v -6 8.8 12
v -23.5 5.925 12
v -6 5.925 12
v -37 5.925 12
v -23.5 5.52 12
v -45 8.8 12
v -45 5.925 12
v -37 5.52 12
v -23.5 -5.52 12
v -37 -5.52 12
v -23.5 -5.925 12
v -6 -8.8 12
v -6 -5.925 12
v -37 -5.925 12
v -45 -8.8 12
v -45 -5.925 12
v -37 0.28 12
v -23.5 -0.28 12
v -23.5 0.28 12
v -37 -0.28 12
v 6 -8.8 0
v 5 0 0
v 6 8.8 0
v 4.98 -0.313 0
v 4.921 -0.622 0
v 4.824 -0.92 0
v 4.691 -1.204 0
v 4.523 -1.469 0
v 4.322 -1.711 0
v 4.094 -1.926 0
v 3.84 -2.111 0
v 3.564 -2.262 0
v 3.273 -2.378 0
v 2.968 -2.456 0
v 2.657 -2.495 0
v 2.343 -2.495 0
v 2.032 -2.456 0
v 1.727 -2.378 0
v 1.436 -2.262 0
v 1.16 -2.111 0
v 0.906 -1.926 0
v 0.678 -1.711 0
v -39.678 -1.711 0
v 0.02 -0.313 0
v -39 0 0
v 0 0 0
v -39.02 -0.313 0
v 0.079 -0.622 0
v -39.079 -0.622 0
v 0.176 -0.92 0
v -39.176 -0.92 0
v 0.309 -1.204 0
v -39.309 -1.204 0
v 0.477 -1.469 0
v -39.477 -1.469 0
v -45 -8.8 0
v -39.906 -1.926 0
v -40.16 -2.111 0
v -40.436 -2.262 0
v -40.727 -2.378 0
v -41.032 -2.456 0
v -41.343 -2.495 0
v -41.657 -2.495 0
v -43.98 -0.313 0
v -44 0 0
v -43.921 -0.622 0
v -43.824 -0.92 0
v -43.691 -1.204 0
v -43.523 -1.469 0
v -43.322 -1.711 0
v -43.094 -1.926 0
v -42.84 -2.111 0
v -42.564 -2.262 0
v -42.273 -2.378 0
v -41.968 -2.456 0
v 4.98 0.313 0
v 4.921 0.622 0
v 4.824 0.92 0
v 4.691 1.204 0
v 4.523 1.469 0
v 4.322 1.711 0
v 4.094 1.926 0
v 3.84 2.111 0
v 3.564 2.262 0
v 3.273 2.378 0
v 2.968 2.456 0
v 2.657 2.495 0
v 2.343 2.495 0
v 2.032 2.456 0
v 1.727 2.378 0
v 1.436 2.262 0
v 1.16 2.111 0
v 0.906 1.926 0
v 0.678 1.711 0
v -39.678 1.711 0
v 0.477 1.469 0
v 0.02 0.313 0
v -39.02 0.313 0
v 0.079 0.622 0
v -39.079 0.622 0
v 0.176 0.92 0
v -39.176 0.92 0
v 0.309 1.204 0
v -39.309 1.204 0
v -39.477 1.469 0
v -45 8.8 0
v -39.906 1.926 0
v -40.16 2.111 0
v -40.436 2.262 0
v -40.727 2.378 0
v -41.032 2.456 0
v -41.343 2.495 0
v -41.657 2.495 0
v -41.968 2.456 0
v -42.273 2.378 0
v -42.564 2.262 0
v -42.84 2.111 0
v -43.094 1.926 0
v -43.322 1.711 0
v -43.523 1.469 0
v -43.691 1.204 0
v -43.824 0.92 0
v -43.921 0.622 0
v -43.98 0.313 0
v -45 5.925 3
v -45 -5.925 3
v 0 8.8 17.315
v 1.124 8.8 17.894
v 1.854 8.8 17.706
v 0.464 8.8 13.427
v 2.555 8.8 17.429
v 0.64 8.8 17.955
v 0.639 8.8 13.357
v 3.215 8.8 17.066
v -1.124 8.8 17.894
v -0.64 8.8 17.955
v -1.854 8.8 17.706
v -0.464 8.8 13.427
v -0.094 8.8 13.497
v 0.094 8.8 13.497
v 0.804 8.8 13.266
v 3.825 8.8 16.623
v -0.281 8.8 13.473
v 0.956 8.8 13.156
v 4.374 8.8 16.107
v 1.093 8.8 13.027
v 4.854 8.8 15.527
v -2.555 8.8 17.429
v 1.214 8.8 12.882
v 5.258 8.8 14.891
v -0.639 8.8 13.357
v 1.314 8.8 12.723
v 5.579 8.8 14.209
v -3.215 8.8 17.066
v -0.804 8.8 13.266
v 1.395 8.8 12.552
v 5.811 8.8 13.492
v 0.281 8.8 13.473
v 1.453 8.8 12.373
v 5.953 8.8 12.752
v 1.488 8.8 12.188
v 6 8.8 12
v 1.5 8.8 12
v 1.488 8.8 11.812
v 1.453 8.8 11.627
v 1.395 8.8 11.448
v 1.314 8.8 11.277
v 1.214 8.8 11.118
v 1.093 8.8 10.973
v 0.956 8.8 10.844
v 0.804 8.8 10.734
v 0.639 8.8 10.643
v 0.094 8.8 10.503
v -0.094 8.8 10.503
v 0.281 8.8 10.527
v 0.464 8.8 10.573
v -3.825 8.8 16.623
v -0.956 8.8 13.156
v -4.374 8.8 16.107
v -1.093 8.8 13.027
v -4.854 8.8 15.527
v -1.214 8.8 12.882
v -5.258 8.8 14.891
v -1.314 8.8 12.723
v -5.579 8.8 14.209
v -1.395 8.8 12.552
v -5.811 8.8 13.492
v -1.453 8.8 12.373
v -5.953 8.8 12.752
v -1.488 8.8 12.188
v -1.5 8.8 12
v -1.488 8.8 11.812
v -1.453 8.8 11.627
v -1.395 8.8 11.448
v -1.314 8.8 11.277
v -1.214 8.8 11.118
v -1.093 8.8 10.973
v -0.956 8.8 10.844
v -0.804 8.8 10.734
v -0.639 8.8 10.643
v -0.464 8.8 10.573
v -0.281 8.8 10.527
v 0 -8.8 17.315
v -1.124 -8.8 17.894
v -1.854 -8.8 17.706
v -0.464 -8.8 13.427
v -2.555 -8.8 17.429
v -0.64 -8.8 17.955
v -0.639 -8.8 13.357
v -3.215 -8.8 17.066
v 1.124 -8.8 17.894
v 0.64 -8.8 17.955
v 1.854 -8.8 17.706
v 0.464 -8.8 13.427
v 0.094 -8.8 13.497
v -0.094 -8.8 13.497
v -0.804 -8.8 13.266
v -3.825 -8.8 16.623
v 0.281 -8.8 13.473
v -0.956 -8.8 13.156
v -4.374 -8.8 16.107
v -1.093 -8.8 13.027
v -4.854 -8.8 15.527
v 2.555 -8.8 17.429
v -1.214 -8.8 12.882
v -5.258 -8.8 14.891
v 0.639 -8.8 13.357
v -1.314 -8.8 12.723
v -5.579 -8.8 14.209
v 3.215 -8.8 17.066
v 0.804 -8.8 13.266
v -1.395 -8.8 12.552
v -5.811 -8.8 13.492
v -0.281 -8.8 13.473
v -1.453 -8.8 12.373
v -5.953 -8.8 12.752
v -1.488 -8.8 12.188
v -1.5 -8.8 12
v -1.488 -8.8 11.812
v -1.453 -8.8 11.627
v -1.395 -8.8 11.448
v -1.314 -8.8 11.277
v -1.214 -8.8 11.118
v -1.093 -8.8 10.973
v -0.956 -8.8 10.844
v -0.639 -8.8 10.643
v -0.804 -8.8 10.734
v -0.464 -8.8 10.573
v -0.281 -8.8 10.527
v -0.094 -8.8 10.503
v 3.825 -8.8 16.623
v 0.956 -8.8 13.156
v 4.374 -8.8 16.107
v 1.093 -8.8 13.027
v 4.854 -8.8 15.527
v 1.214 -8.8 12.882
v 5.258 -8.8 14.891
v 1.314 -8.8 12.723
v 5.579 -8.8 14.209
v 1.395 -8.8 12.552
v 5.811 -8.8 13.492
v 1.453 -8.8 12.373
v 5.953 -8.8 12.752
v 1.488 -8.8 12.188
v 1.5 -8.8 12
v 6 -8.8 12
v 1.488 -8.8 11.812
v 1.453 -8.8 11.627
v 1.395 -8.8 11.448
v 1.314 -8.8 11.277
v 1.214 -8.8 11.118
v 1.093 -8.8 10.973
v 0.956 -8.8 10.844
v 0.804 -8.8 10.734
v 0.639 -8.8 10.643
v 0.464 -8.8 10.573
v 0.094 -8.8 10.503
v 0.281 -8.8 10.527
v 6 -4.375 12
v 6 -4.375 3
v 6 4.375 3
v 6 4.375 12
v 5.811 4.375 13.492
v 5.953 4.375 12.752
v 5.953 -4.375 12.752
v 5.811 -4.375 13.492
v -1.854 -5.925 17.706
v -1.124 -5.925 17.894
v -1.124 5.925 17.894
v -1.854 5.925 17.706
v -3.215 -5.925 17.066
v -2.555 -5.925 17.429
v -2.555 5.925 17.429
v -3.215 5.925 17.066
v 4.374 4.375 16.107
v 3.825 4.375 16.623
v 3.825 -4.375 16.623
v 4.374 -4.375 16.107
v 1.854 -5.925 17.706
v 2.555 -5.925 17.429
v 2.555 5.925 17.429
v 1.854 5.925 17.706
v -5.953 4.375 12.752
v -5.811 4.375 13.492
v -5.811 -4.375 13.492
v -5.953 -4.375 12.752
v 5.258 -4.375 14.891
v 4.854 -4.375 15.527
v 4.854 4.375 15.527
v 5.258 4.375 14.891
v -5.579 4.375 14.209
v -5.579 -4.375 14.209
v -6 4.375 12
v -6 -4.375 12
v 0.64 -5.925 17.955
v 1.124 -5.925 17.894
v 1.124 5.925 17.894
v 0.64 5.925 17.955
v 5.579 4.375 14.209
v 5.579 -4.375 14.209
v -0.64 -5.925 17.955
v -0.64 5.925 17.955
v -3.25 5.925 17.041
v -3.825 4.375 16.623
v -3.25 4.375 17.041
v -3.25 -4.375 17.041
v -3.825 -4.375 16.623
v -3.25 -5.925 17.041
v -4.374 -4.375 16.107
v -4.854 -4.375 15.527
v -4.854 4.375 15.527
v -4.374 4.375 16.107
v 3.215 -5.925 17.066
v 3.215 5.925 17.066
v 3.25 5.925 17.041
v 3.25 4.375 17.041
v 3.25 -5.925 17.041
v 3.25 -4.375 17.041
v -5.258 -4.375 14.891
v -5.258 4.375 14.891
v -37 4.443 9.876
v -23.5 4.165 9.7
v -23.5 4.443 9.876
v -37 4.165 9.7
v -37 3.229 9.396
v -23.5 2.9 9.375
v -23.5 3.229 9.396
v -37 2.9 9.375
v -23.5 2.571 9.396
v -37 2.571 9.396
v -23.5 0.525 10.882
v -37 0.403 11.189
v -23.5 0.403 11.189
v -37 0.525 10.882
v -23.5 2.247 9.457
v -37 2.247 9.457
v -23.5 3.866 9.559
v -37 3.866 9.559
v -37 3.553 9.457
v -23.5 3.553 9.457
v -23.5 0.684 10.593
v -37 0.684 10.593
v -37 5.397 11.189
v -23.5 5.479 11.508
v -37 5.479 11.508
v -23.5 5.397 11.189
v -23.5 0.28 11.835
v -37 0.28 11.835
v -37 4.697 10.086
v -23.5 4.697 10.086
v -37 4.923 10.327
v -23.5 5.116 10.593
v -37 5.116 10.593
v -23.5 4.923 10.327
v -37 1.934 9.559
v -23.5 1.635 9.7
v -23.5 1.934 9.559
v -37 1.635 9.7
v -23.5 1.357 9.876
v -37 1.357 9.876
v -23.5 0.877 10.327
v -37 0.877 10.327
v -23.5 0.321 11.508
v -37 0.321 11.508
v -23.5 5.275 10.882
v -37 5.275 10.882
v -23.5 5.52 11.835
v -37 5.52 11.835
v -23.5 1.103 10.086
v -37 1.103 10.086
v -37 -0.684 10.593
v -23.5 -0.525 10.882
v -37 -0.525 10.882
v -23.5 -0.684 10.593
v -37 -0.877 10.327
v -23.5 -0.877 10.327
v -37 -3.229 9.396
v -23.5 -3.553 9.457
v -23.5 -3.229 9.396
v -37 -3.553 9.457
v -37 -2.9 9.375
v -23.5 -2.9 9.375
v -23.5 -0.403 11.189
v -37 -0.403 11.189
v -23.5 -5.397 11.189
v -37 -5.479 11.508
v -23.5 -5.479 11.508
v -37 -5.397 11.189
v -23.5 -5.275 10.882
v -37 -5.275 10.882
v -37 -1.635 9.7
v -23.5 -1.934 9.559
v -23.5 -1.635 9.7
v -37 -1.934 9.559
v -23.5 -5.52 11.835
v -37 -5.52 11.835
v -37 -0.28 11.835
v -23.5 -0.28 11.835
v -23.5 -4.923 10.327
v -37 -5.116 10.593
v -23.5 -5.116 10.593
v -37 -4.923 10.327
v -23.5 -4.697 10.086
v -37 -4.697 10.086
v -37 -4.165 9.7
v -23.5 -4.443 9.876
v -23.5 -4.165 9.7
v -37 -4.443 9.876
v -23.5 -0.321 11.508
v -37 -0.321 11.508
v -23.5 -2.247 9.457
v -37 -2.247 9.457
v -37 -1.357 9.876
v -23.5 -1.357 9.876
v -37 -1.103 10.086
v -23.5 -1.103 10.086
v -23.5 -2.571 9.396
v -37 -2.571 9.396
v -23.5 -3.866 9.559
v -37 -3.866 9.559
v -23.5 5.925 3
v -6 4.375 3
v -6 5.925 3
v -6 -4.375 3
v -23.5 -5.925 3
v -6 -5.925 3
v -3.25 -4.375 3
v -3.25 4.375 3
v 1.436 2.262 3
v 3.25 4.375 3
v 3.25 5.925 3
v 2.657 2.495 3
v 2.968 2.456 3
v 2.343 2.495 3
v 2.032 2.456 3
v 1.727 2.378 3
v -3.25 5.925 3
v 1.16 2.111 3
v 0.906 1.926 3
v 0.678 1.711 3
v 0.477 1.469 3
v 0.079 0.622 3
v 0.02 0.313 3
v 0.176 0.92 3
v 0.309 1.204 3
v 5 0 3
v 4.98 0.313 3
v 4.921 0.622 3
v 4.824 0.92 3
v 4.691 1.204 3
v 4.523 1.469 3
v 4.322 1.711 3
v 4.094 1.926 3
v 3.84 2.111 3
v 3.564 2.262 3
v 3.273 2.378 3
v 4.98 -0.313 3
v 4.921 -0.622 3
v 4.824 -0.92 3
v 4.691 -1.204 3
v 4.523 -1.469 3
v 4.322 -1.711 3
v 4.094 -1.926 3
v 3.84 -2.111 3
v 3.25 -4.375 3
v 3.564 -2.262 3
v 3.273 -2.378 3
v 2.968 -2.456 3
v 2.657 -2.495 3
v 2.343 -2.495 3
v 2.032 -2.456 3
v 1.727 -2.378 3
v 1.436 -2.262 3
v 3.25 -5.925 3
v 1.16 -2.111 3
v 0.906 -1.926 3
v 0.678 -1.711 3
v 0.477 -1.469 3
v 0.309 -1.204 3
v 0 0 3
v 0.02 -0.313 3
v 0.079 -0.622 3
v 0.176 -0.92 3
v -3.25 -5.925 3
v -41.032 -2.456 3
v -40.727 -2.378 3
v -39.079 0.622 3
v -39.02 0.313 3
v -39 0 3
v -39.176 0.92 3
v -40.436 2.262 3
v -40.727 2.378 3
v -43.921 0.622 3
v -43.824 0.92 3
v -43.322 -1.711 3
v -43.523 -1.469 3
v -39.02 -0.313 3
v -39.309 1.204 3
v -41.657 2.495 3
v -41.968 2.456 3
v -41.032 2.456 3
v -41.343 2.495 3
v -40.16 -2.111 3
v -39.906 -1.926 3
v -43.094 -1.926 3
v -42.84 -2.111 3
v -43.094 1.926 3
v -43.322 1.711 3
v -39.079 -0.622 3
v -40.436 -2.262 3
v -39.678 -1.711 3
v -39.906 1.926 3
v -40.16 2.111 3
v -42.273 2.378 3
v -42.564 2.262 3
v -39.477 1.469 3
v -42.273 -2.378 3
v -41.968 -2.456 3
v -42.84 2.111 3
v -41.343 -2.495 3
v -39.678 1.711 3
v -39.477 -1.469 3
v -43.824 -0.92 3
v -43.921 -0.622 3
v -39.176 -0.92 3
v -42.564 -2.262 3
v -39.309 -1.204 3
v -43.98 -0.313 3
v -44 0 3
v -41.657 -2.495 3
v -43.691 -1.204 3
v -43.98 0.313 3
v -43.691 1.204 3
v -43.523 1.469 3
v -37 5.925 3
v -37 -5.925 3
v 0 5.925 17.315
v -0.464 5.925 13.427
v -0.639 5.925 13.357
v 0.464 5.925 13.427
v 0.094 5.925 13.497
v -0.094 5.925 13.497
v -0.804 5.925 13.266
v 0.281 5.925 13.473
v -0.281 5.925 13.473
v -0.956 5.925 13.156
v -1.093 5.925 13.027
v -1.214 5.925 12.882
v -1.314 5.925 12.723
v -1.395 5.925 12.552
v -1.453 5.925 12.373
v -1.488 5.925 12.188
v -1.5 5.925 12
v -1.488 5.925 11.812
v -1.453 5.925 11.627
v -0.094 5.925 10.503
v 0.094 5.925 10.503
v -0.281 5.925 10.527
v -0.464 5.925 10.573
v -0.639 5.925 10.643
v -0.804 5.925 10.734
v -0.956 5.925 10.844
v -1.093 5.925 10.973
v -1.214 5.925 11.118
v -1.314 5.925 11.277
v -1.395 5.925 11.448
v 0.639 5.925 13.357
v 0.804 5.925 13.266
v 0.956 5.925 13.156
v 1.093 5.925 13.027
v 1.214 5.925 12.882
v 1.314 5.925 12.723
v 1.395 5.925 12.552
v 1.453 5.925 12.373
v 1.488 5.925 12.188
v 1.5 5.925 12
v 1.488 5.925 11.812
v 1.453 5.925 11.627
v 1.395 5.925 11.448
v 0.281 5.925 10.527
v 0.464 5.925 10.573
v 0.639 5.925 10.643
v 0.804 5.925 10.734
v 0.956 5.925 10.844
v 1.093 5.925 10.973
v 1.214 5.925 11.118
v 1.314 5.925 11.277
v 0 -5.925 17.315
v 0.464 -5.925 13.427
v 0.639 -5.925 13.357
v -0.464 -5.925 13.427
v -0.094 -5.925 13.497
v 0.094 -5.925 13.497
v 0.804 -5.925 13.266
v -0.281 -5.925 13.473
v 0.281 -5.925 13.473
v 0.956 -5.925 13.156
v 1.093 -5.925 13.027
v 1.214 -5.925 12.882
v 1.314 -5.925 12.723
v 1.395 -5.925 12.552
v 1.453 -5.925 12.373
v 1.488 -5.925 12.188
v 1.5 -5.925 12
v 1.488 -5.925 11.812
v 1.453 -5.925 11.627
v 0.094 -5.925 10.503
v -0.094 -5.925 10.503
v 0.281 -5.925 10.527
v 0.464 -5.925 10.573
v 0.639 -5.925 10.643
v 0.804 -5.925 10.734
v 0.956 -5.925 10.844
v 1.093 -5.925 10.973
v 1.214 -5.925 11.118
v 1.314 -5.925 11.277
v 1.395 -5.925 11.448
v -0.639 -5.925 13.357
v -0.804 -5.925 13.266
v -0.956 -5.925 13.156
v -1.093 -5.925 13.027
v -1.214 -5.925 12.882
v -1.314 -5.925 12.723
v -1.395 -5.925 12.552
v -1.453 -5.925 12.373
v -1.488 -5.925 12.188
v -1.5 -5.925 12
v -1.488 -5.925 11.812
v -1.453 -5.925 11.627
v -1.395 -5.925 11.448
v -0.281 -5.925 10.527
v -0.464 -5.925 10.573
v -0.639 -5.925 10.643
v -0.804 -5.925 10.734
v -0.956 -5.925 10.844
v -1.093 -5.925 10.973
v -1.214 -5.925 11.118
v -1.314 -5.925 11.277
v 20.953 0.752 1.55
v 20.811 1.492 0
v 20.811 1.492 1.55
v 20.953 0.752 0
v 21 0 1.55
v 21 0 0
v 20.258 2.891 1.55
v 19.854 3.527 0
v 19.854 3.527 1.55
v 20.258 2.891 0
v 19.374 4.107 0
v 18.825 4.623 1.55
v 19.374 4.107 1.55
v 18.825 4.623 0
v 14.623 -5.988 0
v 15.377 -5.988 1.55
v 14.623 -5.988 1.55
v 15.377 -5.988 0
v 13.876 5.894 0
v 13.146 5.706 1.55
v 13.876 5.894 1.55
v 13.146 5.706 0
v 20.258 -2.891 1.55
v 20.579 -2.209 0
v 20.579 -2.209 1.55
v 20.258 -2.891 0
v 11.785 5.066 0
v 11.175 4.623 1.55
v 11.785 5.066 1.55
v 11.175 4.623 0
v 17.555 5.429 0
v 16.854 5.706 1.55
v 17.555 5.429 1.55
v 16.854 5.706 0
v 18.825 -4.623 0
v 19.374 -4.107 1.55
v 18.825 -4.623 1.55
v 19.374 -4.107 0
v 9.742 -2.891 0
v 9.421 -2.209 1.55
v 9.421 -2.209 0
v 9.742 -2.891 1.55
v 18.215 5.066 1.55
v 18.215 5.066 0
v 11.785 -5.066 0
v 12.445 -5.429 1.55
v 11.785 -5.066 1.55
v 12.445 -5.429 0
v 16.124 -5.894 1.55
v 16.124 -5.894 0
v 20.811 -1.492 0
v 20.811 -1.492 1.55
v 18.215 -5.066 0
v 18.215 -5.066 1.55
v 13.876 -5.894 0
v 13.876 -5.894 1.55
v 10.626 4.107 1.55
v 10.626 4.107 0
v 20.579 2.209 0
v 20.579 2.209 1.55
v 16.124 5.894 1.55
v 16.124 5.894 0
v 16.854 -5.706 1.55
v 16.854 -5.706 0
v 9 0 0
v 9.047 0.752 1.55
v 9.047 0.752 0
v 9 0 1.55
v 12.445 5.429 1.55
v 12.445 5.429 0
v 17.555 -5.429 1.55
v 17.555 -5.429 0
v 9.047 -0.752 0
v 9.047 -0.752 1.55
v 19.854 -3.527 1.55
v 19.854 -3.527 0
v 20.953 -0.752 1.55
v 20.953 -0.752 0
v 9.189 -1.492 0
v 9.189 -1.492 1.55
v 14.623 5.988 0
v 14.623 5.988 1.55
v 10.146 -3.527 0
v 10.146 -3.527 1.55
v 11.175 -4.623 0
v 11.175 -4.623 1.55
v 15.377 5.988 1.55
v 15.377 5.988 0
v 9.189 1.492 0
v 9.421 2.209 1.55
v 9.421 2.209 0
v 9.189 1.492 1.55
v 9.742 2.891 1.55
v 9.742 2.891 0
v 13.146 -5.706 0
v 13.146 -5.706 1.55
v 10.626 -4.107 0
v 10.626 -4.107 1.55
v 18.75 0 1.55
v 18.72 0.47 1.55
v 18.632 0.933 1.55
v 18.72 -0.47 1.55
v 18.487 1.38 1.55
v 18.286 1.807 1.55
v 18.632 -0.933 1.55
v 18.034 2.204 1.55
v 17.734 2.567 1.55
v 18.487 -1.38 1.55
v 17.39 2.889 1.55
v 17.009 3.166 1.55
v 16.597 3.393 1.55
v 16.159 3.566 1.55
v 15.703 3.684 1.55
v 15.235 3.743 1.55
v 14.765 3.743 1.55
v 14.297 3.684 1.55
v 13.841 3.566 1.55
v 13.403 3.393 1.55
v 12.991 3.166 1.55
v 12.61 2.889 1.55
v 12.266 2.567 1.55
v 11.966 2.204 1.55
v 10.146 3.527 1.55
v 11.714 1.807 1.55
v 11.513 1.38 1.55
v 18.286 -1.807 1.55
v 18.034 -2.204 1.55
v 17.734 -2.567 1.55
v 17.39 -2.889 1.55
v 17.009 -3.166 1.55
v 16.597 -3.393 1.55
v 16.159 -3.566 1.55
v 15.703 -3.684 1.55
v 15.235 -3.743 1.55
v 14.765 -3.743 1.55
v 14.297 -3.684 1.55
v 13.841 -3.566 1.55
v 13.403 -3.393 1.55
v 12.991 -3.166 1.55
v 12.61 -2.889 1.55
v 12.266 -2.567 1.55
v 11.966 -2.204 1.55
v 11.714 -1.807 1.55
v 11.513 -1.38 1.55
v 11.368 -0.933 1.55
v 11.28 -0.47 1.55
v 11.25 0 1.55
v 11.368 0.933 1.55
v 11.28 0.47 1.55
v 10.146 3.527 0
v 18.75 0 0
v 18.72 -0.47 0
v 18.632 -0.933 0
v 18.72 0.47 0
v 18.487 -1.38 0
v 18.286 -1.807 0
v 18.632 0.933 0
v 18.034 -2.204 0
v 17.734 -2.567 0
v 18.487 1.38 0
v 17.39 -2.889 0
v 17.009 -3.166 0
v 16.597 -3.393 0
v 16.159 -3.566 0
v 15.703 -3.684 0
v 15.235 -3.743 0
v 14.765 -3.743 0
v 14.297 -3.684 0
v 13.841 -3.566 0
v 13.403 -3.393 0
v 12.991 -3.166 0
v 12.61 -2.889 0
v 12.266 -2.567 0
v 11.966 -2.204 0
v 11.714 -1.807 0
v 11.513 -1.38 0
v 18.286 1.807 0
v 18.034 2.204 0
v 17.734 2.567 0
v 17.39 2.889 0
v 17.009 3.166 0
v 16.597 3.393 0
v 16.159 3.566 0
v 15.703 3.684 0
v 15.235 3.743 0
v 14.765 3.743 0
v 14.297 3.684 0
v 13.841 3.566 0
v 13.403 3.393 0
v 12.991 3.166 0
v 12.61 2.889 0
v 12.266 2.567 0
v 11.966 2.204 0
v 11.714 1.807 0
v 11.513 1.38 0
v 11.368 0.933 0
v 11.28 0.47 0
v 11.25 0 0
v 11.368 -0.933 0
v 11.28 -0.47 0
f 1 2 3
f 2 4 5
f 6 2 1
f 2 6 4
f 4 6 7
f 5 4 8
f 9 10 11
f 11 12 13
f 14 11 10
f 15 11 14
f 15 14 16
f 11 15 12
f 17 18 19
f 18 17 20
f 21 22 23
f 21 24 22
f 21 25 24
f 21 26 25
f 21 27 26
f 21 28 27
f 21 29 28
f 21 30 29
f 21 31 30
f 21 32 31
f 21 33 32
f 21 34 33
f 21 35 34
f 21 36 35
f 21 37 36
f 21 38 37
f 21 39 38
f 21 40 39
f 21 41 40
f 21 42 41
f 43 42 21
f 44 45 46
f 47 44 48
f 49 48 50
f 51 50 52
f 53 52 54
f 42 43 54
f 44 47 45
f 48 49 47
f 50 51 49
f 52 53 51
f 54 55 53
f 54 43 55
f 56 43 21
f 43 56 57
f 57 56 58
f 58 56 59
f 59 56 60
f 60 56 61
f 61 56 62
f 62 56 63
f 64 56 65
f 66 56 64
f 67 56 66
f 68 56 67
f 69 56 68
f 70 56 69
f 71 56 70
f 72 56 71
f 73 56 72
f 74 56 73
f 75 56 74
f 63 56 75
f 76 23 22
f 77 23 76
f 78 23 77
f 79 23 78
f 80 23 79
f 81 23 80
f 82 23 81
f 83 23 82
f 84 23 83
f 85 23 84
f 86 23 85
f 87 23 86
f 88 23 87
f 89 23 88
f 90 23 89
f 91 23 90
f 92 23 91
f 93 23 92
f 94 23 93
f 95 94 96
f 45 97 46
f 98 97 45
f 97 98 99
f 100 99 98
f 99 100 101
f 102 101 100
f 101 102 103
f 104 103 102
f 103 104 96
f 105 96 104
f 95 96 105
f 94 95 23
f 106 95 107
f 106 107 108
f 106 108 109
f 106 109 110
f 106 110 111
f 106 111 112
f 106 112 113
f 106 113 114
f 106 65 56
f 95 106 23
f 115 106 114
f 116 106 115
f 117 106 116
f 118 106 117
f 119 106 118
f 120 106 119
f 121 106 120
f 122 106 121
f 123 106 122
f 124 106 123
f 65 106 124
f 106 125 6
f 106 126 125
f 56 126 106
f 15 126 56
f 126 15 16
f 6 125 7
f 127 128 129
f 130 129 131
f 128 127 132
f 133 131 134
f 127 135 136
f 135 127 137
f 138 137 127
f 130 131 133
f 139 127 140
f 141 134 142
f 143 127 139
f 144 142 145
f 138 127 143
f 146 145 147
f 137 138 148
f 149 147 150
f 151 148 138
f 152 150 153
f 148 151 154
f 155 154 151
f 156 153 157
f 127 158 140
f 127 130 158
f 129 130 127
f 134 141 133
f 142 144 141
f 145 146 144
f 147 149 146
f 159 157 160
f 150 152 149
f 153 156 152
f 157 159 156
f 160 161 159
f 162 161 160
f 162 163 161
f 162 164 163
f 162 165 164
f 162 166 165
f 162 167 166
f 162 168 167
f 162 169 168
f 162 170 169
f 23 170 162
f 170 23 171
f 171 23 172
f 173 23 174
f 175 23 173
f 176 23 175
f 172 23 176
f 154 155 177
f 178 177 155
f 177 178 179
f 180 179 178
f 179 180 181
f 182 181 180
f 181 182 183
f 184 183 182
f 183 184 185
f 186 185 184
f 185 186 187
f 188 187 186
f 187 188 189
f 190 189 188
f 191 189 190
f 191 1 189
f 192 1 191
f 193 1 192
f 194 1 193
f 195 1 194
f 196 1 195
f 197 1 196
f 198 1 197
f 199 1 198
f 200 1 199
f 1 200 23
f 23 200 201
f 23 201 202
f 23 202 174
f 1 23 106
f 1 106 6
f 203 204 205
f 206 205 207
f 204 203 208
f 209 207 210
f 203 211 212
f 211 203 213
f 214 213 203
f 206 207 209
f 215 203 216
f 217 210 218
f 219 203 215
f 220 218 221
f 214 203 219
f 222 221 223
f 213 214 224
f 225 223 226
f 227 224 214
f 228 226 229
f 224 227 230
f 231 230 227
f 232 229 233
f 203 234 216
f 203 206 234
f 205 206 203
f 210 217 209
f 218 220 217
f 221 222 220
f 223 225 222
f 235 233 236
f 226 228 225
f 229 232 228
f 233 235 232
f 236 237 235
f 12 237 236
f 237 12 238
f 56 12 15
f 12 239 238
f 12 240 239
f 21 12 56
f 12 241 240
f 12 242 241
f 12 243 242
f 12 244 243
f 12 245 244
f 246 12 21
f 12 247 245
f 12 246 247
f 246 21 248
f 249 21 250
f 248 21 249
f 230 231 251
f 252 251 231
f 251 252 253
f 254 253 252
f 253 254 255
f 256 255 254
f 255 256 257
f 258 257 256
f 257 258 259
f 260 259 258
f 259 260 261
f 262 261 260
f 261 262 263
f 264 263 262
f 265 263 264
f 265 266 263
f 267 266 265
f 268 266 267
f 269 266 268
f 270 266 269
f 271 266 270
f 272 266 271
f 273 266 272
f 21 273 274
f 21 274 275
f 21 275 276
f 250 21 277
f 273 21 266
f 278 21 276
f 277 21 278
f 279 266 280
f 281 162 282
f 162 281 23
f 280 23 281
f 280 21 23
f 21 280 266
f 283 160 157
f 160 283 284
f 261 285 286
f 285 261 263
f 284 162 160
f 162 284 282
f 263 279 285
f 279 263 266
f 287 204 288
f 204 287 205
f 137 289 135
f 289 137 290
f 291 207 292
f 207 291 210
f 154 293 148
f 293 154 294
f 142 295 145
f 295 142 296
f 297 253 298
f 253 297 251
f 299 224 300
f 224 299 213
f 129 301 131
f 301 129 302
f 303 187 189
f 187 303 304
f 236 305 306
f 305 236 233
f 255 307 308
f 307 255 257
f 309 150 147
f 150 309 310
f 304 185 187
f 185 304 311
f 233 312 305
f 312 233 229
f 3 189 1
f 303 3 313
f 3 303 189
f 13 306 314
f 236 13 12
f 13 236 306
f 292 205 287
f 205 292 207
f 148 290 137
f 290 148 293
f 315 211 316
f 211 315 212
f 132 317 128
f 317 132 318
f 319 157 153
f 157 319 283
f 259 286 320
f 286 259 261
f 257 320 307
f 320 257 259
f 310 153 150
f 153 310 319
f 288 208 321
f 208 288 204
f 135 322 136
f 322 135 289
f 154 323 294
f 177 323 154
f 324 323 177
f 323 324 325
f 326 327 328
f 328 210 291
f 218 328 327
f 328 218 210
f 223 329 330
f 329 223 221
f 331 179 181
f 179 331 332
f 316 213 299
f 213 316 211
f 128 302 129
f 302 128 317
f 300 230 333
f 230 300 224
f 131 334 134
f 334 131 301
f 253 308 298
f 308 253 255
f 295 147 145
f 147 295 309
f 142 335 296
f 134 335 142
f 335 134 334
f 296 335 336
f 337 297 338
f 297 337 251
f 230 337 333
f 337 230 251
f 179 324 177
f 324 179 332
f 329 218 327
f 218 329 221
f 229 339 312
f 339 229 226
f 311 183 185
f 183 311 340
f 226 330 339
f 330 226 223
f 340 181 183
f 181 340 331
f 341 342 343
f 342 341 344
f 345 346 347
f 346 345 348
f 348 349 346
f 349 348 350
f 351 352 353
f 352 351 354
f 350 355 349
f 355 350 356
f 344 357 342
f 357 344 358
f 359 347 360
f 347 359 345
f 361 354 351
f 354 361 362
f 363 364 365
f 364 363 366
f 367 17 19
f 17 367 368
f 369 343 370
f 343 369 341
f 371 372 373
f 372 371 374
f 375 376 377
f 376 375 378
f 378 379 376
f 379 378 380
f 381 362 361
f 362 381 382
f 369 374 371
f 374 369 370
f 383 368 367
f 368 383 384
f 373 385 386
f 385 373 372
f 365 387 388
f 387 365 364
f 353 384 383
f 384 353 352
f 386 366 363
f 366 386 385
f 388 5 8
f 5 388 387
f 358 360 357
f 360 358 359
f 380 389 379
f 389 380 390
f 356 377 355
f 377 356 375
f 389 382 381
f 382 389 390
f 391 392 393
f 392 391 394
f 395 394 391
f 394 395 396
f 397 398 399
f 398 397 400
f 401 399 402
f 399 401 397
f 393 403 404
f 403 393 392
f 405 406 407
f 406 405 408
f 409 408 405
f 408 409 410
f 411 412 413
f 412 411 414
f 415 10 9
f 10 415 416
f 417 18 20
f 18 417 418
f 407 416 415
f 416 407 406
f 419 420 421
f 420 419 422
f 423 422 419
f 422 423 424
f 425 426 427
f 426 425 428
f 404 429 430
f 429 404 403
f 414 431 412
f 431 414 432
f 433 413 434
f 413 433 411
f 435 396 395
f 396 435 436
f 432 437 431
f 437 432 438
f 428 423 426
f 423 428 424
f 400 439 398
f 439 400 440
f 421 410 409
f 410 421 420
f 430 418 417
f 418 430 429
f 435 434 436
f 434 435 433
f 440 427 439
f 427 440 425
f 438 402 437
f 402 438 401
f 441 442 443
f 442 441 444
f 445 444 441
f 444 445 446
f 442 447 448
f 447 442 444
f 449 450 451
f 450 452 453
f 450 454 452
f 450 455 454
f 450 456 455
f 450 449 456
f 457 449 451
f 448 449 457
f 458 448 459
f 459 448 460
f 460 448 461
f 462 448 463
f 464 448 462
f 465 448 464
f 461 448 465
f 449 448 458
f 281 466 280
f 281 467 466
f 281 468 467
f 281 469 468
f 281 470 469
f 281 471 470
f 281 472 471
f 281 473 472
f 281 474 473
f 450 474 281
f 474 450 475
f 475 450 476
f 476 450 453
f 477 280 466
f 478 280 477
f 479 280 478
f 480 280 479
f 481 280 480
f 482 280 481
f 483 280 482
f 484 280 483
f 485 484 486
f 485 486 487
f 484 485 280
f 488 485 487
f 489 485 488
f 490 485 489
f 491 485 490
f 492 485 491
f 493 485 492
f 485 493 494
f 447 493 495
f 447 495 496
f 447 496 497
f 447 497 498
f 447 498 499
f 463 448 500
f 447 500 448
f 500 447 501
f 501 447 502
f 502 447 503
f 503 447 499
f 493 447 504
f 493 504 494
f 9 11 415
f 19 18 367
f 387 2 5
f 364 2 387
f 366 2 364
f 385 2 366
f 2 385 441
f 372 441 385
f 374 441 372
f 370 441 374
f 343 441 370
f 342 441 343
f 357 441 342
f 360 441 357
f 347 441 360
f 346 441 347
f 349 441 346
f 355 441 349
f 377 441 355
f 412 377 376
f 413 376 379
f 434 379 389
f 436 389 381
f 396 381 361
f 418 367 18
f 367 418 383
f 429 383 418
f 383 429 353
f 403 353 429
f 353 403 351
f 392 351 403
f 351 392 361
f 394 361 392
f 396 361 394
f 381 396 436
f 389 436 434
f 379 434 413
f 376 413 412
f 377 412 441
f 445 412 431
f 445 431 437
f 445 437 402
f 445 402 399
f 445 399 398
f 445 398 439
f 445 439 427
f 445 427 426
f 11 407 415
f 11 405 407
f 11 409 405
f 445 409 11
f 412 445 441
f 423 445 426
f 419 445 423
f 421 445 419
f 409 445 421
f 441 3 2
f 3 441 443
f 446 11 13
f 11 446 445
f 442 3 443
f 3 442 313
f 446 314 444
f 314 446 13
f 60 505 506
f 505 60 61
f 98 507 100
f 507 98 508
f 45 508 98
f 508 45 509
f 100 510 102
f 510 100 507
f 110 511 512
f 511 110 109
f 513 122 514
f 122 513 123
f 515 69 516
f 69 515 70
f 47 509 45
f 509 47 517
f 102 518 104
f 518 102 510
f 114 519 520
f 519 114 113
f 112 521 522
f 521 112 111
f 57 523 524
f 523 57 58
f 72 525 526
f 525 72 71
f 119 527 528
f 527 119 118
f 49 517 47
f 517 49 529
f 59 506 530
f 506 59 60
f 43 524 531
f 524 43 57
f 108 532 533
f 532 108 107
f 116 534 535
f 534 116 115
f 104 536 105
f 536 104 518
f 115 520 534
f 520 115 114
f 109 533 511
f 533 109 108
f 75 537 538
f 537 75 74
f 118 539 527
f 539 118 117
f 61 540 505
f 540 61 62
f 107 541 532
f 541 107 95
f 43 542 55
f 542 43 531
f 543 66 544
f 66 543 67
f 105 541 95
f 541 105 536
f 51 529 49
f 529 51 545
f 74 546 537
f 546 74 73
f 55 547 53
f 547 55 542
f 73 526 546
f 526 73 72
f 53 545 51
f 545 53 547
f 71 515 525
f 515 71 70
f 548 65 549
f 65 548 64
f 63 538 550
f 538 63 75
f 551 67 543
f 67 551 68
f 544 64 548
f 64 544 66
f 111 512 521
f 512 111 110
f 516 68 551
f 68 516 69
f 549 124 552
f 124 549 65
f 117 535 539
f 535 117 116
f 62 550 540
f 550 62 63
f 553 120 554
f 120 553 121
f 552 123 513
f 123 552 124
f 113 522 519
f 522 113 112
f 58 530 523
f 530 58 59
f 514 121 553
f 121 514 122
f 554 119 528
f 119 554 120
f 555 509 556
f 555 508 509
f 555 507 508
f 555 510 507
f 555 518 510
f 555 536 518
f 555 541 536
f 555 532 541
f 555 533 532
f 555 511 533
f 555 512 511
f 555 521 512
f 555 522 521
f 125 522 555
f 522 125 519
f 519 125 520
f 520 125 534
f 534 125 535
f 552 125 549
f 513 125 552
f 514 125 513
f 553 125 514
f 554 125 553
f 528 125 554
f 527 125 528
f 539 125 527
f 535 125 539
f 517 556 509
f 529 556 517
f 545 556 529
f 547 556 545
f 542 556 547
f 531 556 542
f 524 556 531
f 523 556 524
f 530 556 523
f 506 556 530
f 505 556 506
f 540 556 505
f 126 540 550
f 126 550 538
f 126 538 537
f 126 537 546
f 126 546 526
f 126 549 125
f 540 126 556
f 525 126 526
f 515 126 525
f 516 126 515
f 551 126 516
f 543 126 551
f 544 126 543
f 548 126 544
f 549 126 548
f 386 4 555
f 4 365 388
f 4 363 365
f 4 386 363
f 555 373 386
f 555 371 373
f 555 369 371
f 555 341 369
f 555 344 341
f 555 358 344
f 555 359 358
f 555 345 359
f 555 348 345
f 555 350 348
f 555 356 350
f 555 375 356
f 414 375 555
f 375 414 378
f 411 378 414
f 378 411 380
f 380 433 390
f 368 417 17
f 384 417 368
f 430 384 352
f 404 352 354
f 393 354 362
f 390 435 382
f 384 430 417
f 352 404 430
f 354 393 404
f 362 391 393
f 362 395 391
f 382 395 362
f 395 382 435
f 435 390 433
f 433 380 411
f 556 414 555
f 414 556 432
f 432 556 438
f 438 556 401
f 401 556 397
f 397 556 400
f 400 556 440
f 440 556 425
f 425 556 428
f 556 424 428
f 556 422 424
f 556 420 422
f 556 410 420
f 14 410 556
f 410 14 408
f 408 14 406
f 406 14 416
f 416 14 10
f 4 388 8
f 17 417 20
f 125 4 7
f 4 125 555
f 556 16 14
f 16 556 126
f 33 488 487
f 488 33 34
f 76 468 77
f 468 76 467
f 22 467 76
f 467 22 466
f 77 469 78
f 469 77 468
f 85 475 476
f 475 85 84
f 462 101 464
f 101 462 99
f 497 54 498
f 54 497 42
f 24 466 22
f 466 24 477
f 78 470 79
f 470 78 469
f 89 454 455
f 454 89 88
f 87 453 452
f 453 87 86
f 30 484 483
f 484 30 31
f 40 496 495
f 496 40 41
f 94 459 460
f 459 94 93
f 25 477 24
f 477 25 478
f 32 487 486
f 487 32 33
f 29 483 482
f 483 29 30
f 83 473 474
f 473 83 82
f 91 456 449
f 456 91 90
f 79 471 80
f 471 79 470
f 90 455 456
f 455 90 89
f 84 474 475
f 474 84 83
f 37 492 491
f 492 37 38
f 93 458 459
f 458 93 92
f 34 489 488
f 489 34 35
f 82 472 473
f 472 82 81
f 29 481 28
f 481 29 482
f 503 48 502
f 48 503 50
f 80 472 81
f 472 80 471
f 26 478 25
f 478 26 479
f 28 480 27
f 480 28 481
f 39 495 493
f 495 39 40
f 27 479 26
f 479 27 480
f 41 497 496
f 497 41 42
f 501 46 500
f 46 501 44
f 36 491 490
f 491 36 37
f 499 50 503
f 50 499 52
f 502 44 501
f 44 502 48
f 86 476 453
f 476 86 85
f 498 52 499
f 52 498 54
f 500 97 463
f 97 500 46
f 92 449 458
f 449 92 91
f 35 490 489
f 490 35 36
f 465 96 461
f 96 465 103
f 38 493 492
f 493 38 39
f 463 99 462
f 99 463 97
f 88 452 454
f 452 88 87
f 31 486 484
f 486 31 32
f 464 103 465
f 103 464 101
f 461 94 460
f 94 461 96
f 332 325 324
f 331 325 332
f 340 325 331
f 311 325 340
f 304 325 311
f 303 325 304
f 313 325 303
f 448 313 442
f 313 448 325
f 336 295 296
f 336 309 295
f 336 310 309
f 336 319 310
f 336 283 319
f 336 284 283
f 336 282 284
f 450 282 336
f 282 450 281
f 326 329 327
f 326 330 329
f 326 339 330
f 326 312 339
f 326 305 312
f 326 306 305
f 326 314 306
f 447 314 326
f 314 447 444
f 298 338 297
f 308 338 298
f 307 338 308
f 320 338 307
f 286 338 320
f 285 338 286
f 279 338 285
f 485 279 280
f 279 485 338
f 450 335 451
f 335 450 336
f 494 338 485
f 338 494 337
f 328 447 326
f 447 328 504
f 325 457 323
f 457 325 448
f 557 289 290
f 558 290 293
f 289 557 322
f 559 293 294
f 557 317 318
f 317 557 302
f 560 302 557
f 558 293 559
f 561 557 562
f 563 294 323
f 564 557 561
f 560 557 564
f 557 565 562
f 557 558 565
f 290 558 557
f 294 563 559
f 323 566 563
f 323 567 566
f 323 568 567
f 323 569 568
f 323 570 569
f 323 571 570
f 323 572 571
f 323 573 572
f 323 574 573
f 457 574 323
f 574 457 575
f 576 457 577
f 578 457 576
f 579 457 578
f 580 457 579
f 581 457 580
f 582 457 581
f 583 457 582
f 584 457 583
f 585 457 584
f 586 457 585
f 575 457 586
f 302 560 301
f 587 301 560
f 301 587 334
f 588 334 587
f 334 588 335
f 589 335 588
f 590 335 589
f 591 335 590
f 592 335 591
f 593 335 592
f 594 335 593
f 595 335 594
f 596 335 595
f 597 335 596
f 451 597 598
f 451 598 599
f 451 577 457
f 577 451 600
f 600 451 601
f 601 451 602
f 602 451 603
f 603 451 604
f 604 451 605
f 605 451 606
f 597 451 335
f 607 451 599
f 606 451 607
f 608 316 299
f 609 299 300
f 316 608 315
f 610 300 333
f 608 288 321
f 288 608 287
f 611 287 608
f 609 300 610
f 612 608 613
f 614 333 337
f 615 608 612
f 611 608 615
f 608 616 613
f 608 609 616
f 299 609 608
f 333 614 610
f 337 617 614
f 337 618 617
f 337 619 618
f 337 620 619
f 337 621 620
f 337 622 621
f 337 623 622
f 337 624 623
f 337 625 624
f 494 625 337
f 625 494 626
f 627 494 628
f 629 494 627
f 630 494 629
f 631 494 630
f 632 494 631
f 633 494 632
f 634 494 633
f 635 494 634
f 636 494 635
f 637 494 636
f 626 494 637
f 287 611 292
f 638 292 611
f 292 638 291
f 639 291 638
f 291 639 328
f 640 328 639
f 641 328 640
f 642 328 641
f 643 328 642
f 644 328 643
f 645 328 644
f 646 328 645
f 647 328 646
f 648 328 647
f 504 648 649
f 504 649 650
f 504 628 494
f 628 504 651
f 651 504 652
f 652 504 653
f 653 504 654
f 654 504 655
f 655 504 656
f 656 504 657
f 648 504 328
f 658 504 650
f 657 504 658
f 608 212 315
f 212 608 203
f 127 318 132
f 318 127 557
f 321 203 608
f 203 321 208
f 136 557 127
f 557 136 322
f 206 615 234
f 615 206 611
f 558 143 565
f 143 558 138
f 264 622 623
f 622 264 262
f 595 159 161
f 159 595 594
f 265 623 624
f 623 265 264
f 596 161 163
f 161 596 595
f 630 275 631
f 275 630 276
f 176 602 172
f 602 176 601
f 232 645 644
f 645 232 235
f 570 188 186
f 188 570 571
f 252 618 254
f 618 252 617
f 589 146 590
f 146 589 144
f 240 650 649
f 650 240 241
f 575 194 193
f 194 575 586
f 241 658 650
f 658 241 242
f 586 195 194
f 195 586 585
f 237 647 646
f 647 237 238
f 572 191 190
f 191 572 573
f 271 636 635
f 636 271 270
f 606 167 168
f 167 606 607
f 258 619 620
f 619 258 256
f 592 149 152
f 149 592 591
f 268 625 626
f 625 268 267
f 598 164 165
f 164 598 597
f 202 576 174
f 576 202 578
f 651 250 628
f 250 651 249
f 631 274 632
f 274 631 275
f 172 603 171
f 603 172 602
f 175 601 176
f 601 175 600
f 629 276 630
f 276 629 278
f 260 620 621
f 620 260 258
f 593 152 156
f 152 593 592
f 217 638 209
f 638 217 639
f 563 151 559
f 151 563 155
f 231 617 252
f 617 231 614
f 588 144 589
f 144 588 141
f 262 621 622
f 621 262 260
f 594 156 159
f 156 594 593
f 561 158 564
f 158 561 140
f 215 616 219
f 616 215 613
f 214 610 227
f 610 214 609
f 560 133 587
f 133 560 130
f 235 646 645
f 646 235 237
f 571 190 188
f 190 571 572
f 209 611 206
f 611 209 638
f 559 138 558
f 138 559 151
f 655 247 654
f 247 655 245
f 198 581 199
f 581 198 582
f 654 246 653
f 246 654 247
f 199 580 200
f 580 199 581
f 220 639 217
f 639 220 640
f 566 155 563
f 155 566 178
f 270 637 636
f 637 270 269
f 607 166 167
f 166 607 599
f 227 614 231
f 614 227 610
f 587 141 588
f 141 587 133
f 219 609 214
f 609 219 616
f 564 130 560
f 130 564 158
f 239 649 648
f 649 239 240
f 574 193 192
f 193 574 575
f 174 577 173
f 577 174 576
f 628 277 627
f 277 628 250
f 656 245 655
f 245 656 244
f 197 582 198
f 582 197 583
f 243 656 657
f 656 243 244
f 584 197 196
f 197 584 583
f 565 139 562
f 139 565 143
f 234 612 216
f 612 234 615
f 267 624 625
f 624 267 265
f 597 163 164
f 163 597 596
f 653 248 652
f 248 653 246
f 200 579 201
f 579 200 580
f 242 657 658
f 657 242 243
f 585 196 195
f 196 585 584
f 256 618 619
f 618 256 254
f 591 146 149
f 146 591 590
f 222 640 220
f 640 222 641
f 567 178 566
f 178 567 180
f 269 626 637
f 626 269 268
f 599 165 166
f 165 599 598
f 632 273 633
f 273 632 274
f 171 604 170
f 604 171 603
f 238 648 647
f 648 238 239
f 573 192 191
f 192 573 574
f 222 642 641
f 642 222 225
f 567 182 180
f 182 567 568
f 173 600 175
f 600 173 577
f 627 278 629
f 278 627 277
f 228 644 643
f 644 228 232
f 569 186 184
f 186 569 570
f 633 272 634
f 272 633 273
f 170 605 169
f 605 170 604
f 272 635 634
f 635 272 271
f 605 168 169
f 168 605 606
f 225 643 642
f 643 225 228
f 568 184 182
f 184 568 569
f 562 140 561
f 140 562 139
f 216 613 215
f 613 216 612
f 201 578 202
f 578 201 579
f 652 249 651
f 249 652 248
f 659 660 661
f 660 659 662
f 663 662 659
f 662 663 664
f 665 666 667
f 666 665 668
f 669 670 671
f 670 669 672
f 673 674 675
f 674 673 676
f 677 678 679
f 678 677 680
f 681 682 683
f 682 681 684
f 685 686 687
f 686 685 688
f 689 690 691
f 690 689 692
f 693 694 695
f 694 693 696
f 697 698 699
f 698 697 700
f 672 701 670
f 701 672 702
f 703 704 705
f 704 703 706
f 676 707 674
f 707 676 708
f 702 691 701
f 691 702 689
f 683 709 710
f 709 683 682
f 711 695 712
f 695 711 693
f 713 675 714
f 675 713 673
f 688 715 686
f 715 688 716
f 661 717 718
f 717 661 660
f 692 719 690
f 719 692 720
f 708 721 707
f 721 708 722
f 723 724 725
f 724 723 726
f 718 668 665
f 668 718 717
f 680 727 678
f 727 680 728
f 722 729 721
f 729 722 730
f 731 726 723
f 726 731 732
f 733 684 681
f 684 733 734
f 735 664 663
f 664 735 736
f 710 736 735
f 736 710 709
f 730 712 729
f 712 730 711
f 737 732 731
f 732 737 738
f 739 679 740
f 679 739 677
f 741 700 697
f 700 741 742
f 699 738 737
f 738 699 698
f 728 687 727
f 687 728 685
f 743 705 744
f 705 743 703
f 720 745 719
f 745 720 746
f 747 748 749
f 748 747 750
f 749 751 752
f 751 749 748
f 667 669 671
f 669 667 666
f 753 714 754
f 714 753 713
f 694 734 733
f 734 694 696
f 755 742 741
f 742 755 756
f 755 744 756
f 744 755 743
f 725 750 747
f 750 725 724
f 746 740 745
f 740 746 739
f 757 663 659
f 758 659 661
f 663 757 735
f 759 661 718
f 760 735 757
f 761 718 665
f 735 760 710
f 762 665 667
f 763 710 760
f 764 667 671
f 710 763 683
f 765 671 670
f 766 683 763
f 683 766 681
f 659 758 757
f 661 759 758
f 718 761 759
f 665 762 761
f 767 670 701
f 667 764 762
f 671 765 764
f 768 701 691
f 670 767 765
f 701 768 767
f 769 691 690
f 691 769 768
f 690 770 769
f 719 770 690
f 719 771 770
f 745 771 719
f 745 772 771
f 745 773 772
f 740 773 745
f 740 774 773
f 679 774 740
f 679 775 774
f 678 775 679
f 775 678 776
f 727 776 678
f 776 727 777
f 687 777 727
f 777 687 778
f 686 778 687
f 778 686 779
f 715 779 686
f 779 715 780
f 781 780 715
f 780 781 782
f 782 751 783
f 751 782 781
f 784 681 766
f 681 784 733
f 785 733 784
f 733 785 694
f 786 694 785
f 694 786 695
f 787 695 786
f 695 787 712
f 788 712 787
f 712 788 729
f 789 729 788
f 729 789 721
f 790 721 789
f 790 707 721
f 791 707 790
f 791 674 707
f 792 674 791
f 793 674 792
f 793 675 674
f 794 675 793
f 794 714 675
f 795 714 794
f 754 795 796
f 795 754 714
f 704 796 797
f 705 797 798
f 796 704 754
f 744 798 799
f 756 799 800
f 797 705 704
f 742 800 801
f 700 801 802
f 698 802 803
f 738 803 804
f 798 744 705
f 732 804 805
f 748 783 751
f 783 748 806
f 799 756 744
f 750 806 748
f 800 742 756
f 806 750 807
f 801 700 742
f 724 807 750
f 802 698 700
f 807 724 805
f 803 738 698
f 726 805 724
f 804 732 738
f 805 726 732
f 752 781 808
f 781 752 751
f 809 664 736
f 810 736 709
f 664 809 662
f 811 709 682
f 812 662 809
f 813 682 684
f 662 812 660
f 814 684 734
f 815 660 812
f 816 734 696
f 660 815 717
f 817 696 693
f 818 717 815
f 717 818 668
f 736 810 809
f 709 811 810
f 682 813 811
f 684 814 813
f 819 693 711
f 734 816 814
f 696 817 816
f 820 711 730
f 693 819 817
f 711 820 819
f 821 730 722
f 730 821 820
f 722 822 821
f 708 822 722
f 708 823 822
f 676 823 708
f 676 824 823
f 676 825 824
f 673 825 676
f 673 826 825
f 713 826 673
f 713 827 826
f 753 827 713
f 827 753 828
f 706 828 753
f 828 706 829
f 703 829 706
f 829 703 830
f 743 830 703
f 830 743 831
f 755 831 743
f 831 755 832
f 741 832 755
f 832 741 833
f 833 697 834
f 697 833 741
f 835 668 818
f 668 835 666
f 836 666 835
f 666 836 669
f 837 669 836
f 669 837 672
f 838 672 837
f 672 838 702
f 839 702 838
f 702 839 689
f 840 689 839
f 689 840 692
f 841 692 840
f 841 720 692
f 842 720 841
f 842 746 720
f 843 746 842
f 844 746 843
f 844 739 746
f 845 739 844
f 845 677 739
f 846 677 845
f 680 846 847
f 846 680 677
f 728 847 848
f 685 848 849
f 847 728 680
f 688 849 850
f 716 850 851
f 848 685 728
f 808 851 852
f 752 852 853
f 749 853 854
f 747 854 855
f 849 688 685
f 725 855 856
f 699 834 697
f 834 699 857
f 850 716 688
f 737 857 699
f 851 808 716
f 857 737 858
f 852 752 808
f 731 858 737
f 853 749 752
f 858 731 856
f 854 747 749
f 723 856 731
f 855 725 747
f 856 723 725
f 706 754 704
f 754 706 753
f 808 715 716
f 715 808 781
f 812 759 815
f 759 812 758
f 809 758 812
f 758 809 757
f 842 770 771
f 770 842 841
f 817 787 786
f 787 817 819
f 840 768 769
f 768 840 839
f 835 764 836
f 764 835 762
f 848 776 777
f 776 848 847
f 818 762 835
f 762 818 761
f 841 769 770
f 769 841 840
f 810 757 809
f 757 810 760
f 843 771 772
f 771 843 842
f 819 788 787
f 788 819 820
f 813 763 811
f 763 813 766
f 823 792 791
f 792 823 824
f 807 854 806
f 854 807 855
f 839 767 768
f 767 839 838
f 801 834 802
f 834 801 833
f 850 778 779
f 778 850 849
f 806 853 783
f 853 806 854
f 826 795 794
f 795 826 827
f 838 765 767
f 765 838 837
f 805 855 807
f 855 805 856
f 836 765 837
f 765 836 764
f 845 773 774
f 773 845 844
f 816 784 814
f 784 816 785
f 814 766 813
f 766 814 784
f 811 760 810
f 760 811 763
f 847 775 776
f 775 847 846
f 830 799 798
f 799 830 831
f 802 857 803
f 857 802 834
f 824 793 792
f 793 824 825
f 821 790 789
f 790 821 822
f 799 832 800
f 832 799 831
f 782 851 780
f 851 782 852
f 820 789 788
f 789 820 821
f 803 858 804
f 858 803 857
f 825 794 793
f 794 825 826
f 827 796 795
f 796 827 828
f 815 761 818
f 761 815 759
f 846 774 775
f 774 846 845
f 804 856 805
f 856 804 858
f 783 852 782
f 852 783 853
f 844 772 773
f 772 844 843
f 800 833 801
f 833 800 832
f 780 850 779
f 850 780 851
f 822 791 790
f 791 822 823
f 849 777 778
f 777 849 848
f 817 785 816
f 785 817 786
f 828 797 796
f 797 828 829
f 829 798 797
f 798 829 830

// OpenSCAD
/* [Eyelet dimensions] */

// thckness of jig walls
wall_t=3;

// insert internal diameter
eye_insert_id=3;

// insert outer diameter for spacer sizing
eye_insert_od=6.5;

// eyelet outer diameter for spacer sizing
eye_od=12;

// width of the insert
eye_insert_w=5.8;

// width of the outer shell
eye_outer_w=4.25;

// length from tip of threaded part to center of mounting hole
eye_l=45;

// length of the threaded part
eye_thread_l=17;

/* [Diagonal rod size] */

// outer diameter
rod_od=5;

// length
rod_l=310;

/* [Diagonal total length] */

// space between centers of bolt holes on either end of rod
eye_space=325;

/* [Hidden] */

$fn=50;

// diameter of screws to be used
screw_d=3;

screw_l=2*eye_insert_w+2*wall_t;

extrusion_w=20;

mount_screw_d=5;
mount_screw_head_d=7;
mount_screw_head_h=4;

assembly_offset=wall_t+mount_screw_head_h+rod_od;
rod_support_w=2*eye_insert_w+2*wall_t;

spacer_w=eye_insert_w-eye_outer_w;

module spacer(){
    translate([1.25*eye_od,0,spacer_w/2]) difference(){
        cylinder(d=eye_od,h=spacer_w,center=true);
        cylinder(d=eye_insert_od+1,h=spacer_w+0.1,center=true);
    }
}

//!eye_support();
module eye_support(){
    translate([0,0,assembly_offset/2])difference(){
        union(){
            translate([-eye_l/2,0,0])cube([eye_l,rod_support_w,assembly_offset],center=true);
            cube([eye_od,rod_support_w,assembly_offset],center=true);
            translate([0,0,assembly_offset/2])rotate([90,0,0])cylinder(d=eye_od,h=rod_support_w,center=true);
        }
        // rod cradle
        for (m=[0,1])mirror([0,m,0])translate([-eye_l,eye_insert_w/2,assembly_offset/2])rotate([0,90,0])cylinder(d=rod_od+0.25,h=eye_l,center=true);
        // eye cutout
        translate([0,0,eye_od/2+wall_t])difference(){
            cube([eye_l+2,2*eye_insert_w+0.25,assembly_offset+eye_od],center=true);
            cube([eye_od,2*eye_insert_w+1,assembly_offset+eye_od+1],center=true);
        }
        translate([0,0,eye_od/2+wall_t])cube([eye_od*2,2*eye_outer_w+0.25,assembly_offset+eye_od],center=true);
        translate([0,0,eye_od/2+wall_t])cube([eye_insert_od,2*eye_insert_w+0.25,assembly_offset+eye_od],center=true);
        // alignment_notch
        translate([0,0,assembly_offset/2+1.15*eye_od])rotate([0,45,0])cube([eye_od,rod_support_w+1,eye_od],center=true);
        // screw_hole
        translate([0,0,assembly_offset/2])rotate([90,0,0])cylinder(d=eye_insert_id,h=rod_support_w+1,center=true);
        // mount screws
        translate([-(eye_l-mount_screw_head_d/2),0,0]){
            cylinder(d=mount_screw_d,h=assembly_offset+2,center=true);
            translate([0,0,wall_t])cylinder(d=mount_screw_head_d,h=assembly_offset,center=true);
            translate([0,0,wall_t])cube([mount_screw_head_d+2,2*eye_insert_w+0.25,assembly_offset],center=true);
        }
        translate([(eye_od-mount_screw_head_d)/2,0,0]){
            cylinder(d=mount_screw_d,h=assembly_offset+2,center=true);
            translate([0,0,wall_t])cylinder(d=mount_screw_head_d,h=assembly_offset,center=true);
        }
    }
}

eye_support();
spacer();
